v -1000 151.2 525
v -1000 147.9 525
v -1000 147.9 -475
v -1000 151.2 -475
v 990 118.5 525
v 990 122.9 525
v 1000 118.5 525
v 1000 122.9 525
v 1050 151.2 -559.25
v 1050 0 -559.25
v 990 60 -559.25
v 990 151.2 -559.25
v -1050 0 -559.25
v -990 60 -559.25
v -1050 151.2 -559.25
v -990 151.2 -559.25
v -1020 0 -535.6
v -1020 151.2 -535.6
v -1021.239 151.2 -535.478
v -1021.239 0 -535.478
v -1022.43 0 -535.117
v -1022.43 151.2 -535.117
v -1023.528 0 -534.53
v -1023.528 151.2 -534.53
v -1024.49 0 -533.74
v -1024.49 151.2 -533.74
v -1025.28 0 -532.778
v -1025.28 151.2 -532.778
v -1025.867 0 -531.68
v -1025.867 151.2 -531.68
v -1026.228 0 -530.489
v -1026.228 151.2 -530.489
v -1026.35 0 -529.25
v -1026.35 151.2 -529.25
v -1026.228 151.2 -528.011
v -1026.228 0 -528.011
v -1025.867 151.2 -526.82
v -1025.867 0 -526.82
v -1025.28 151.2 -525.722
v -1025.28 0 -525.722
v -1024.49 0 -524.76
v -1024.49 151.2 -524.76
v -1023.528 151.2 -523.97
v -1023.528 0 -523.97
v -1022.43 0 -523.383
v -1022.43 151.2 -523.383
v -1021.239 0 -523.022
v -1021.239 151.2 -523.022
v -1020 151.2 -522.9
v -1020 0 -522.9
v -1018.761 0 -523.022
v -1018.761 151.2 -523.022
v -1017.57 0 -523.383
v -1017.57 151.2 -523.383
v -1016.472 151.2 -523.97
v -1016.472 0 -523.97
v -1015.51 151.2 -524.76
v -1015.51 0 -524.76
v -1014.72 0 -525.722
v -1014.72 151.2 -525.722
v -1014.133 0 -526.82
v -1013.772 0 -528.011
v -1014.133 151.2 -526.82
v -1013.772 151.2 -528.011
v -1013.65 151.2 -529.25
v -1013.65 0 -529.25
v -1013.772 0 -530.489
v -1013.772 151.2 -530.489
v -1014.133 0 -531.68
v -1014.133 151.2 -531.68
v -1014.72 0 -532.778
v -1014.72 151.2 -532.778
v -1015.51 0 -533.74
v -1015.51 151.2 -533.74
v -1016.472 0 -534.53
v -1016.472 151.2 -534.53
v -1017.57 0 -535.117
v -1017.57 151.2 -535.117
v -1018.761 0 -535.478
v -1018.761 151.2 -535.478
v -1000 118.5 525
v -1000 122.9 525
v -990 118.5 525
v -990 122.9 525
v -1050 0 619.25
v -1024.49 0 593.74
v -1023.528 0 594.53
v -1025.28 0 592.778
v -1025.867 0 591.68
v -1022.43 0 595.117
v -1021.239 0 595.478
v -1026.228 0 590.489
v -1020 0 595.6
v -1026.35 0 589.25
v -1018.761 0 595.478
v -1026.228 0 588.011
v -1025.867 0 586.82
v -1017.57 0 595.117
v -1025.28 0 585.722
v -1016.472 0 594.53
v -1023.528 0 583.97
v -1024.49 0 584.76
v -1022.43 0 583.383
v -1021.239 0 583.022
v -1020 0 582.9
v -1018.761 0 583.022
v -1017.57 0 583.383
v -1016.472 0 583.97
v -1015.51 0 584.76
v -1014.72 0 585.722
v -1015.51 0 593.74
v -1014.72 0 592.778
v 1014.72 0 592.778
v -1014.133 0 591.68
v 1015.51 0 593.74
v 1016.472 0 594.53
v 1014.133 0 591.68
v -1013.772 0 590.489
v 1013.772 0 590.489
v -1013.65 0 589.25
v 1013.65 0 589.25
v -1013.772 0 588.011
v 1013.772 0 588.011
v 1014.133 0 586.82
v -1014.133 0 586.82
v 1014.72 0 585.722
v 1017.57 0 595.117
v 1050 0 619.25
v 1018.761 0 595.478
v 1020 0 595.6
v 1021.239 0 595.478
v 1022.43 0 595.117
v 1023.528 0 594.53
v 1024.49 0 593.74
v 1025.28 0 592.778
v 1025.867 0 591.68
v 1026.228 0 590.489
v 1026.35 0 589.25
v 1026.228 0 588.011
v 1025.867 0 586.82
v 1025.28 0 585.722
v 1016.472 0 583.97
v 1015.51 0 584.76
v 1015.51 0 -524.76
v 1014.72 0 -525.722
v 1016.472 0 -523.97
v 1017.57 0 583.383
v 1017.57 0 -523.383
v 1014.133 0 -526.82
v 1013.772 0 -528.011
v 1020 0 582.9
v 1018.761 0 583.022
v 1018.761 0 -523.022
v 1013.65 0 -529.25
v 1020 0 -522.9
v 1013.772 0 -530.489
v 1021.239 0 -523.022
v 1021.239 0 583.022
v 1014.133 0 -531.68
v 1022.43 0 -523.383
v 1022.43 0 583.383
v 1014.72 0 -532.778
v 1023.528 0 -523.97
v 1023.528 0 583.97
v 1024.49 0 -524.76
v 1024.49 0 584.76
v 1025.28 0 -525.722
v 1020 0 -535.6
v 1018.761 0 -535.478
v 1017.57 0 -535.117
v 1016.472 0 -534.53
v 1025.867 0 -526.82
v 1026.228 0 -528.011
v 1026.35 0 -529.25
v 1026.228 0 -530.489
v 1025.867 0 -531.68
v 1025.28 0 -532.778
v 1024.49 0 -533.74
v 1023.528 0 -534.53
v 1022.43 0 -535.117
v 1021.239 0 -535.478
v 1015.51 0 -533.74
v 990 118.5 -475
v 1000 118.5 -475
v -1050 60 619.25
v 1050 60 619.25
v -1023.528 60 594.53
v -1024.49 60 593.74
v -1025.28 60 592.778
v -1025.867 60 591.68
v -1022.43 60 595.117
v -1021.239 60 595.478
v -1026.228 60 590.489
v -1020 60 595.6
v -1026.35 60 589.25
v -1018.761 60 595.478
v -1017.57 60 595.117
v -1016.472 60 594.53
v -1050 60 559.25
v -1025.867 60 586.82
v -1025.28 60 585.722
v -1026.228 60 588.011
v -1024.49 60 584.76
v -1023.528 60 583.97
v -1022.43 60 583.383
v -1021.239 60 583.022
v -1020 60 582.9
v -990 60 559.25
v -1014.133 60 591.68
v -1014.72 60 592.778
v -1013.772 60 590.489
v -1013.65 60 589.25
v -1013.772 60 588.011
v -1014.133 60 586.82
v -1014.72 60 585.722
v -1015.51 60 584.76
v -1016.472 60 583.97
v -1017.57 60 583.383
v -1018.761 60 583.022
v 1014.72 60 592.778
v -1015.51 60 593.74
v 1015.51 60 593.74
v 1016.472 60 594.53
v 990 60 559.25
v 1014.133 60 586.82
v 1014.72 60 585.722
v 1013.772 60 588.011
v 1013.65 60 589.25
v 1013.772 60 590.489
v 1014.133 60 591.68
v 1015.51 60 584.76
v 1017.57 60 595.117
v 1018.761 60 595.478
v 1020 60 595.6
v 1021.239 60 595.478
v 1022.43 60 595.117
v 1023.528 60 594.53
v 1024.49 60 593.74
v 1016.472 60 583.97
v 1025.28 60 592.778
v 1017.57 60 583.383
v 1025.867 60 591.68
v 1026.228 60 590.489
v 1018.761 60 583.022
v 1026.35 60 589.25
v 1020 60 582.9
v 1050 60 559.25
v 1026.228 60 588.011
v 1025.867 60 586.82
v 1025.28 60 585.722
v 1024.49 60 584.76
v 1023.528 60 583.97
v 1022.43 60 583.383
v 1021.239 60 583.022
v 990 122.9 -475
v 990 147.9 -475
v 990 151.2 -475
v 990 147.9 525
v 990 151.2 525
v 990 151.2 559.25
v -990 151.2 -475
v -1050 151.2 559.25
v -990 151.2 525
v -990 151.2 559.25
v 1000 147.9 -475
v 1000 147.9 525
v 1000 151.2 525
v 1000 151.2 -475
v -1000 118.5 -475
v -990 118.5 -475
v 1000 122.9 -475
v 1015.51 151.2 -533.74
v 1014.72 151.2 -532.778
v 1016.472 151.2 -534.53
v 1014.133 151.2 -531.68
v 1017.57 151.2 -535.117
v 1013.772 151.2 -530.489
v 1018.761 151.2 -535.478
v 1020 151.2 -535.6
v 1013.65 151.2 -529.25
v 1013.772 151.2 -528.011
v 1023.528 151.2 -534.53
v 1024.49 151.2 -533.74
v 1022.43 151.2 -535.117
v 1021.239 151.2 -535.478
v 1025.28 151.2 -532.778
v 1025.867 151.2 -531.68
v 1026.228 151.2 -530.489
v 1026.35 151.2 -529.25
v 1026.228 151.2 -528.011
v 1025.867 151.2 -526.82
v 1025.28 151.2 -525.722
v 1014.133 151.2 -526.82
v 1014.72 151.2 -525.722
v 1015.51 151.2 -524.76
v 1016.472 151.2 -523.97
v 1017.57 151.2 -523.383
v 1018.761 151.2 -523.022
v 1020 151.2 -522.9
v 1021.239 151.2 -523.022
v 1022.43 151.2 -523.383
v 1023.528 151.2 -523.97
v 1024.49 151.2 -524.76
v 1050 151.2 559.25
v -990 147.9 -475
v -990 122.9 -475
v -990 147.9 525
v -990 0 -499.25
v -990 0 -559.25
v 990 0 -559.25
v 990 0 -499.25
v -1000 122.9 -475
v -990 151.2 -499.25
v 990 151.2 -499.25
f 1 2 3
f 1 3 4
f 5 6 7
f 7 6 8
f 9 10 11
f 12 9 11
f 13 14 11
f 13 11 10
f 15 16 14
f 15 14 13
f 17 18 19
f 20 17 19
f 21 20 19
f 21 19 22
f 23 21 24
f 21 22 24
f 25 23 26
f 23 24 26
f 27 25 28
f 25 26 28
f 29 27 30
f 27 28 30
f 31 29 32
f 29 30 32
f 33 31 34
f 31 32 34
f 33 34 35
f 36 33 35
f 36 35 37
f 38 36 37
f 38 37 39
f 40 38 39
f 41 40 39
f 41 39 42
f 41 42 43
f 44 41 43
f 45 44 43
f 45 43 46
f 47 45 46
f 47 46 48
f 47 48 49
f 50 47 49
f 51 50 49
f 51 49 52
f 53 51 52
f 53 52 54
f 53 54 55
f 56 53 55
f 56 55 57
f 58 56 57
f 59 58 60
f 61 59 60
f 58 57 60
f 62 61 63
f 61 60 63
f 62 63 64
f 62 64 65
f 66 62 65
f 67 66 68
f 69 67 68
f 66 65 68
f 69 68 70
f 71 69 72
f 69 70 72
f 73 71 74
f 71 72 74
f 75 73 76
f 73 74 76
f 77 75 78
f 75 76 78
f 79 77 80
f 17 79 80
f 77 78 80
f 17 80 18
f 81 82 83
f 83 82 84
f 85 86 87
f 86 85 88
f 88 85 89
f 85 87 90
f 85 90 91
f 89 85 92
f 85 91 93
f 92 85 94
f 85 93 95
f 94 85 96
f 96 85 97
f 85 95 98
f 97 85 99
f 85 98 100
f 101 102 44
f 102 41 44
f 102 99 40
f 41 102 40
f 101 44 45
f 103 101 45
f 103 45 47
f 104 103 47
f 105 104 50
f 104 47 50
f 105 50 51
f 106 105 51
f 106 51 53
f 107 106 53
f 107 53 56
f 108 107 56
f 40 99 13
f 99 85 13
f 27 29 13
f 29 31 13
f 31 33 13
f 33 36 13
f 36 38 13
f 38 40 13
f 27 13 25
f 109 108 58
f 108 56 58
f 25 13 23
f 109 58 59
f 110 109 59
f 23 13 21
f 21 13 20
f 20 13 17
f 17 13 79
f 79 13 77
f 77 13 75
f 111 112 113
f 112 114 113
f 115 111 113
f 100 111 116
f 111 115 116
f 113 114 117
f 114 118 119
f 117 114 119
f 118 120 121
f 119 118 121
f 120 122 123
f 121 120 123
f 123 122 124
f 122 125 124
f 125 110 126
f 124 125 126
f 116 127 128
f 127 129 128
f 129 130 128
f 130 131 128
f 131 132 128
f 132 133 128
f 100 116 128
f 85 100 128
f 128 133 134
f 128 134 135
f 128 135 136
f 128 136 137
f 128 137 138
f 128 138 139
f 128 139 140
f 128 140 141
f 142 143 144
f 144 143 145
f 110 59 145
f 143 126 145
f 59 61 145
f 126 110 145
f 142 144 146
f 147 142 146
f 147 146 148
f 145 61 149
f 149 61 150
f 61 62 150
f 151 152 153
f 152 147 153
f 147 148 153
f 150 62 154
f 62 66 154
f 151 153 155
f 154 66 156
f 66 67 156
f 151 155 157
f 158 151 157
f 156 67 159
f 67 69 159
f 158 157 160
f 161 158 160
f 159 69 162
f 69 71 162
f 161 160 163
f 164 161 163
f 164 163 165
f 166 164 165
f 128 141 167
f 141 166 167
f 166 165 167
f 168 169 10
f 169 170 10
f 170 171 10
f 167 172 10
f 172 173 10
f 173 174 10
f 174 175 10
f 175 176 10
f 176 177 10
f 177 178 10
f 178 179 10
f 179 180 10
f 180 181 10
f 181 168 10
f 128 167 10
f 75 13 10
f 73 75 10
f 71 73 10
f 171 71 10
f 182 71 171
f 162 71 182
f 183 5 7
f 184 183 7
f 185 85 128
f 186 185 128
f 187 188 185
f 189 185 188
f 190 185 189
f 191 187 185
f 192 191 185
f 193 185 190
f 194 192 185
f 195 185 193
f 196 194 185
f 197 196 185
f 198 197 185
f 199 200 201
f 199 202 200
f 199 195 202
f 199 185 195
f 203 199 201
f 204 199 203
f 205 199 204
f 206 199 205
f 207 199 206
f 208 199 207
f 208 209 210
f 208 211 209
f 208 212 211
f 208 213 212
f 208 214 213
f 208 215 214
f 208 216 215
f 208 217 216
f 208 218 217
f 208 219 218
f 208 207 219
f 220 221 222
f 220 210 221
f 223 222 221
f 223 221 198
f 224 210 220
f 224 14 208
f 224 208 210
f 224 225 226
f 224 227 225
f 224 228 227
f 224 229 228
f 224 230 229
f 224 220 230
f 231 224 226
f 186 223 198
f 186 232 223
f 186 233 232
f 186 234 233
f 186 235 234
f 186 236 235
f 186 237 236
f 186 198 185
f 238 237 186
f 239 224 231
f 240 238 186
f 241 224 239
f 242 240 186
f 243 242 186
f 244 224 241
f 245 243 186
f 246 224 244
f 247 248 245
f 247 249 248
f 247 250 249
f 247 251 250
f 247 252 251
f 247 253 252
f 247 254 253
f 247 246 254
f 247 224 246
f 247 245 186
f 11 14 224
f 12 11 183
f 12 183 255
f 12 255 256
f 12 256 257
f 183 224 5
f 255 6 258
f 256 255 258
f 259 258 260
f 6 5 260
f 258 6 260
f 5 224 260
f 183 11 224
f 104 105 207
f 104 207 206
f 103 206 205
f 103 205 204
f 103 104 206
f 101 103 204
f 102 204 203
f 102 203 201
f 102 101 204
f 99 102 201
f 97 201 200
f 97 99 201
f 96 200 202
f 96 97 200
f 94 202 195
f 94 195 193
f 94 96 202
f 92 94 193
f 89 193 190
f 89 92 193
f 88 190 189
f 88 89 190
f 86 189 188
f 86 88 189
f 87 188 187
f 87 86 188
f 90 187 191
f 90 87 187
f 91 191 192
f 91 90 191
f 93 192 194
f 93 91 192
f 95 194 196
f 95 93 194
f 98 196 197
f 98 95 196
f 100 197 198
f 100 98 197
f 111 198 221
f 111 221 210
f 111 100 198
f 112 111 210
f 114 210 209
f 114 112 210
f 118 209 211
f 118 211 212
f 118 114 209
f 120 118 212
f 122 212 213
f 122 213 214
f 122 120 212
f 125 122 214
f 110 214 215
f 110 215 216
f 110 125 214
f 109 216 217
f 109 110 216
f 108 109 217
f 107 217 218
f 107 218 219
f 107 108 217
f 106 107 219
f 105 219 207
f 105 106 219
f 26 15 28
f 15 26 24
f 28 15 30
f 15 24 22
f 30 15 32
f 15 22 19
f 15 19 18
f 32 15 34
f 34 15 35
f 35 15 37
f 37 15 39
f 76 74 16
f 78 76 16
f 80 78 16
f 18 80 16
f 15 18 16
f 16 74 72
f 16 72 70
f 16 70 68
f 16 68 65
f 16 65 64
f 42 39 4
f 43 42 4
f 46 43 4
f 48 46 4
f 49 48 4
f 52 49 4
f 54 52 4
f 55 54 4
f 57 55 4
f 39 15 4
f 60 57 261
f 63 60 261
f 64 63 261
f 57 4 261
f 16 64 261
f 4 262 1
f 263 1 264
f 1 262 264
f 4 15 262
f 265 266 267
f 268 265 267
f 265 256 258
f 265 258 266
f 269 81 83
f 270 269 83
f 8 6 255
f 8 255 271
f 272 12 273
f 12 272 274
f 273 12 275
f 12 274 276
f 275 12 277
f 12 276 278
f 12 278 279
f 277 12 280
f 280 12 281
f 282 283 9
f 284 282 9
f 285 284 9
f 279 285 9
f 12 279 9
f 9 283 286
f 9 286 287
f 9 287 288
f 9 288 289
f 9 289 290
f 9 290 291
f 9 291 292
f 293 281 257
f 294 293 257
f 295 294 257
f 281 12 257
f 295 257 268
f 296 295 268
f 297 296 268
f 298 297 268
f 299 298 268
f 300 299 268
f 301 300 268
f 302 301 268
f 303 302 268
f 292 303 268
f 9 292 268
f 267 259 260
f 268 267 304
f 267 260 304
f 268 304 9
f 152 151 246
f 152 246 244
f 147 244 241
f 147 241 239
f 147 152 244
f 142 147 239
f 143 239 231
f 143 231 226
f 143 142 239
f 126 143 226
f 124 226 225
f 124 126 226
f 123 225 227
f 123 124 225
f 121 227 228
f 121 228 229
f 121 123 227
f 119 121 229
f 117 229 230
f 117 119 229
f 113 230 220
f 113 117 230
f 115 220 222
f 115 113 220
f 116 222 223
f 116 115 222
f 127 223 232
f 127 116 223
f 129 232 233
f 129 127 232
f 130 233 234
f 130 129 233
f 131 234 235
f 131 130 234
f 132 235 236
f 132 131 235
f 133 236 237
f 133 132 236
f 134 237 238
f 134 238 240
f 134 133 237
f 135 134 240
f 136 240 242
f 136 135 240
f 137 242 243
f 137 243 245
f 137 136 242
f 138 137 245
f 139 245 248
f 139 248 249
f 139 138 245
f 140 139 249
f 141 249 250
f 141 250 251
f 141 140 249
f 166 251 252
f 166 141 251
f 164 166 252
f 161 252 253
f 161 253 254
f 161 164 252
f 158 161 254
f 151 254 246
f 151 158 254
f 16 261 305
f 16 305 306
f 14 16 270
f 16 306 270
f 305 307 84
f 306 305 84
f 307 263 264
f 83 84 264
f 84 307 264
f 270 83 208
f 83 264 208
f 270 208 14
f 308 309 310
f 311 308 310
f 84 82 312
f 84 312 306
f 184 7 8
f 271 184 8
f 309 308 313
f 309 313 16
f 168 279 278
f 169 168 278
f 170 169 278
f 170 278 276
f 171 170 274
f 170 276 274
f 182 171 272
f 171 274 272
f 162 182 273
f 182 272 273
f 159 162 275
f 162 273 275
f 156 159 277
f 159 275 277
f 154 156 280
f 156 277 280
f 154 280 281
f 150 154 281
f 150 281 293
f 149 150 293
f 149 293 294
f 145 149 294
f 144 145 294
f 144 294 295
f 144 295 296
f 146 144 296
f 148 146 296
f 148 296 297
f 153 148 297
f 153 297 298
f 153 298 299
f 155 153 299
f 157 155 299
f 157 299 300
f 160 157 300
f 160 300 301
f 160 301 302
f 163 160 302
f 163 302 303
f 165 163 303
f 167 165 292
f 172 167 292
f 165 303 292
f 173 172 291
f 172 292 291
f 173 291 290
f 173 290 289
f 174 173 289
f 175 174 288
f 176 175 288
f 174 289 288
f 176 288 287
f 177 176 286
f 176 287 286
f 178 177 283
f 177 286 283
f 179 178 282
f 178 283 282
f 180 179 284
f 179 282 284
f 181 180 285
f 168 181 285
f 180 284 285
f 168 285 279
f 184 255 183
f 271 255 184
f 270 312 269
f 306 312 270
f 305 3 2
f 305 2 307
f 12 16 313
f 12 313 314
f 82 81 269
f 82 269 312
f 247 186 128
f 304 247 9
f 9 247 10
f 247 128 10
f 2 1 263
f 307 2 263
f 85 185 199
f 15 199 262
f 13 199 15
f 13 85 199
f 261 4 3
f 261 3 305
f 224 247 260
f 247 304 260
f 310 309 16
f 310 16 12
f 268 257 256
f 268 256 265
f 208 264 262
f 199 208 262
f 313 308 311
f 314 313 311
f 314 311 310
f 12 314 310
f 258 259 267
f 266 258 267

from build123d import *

# Parameters (mm, degrees)
BOSS_EXTRUDE1_DEPTH = 559.25
SKETCH4_W           = 1980
SKETCH4_H           = 60
BOSS_EXTRUDE2_DEPTH = 151.2
CUT_EXTRUDE2_START  = 25
SKETCH6_W           = 2000
SKETCH6_H           = 3.3
SKETCH6_H_2         = 4.4
CUT_EXTRUDE2_DEPTH  = 500
CUT_EXTRUDE3_START  = 151.2
SKETCH7_R           = 6.35
CUT_EXTRUDE3_DEPTH  = 1351.417245748
SKETCH8_W           = 2100
SKETCH8_H           = 60
BOSS_EXTRUDE3_DEPTH = 60
SKETCH9_R           = 6.35
CUT_EXTRUDE4_DEPTH  = 60


with BuildPart() as part:
    # Sketch3 → Boss-Extrude1 (new, symmetric)
    with BuildSketch(Plane.XY):
        Polygon((-990, 60), (990, 60), (990, 151.2), (1050, 151.2), (1050, 0), (-1050, 0), (-1050, 151.2), (-990, 151.2), align=None)
    extrude(amount=BOSS_EXTRUDE1_DEPTH, both=True)

    # Sketch6 → Cut-Extrude2 (cut, symmetric)
    with BuildSketch(Plane.XY.offset(CUT_EXTRUDE2_START)):
        with Locations((0, 149.55)):
            Rectangle(SKETCH6_W, SKETCH6_H)
        with Locations((0, 120.7)):
            Rectangle(SKETCH6_W, SKETCH6_H_2)
    extrude(amount=CUT_EXTRUDE2_DEPTH, both=True, mode=Mode.SUBTRACT)

    # Sketch7 → Cut-Extrude3 (cut, through all)
    with BuildSketch(Plane(origin=(0, 0, 0), x_dir=(1, 0, 0), z_dir=(0, 1, 0)).offset(CUT_EXTRUDE3_START)):
        with Locations(Location((1020, 529.25, 0), (0, 0, 90))):
            Circle(SKETCH7_R)
        with Locations(Location((-1020, 529.25, 0), (0, 0, 90))):
            Circle(SKETCH7_R)
    extrude(amount=-CUT_EXTRUDE3_DEPTH, mode=Mode.SUBTRACT)

    # Sketch8 → Boss-Extrude3 (add)
    with BuildSketch(Plane(origin=(0, 0, 0), x_dir=(1, 0, 0), z_dir=(0, 1, 0))):
        with Locations((0, -589.25)):
            Rectangle(SKETCH8_W, SKETCH8_H)
    extrude(amount=BOSS_EXTRUDE3_DEPTH)

    # Sketch9 → Cut-Extrude4 (cut)
    with BuildSketch(Plane(origin=(0, 0, 0), x_dir=(1, 0, 0), z_dir=(0, 1, 0))):
        with Locations(Location((-1020, -589.25, 0), (0, 0, 90))):
            Circle(SKETCH9_R)
        with Locations(Location((1020, -589.25, 0), (0, 0, 90))):
            Circle(SKETCH9_R)
    extrude(amount=CUT_EXTRUDE4_DEPTH, mode=Mode.SUBTRACT)


with BuildPart() as body_2:
    # Sketch4 → Boss-Extrude2 (new body)
    with BuildSketch(Plane(origin=(0, 0, 0), x_dir=(1, 0, 0), z_dir=(0, 1, 0))):
        with Locations((0, 529.25)):
            Rectangle(SKETCH4_W, SKETCH4_H)
    extrude(amount=BOSS_EXTRUDE2_DEPTH)


solid = Compound([part.part, body_2.part])
